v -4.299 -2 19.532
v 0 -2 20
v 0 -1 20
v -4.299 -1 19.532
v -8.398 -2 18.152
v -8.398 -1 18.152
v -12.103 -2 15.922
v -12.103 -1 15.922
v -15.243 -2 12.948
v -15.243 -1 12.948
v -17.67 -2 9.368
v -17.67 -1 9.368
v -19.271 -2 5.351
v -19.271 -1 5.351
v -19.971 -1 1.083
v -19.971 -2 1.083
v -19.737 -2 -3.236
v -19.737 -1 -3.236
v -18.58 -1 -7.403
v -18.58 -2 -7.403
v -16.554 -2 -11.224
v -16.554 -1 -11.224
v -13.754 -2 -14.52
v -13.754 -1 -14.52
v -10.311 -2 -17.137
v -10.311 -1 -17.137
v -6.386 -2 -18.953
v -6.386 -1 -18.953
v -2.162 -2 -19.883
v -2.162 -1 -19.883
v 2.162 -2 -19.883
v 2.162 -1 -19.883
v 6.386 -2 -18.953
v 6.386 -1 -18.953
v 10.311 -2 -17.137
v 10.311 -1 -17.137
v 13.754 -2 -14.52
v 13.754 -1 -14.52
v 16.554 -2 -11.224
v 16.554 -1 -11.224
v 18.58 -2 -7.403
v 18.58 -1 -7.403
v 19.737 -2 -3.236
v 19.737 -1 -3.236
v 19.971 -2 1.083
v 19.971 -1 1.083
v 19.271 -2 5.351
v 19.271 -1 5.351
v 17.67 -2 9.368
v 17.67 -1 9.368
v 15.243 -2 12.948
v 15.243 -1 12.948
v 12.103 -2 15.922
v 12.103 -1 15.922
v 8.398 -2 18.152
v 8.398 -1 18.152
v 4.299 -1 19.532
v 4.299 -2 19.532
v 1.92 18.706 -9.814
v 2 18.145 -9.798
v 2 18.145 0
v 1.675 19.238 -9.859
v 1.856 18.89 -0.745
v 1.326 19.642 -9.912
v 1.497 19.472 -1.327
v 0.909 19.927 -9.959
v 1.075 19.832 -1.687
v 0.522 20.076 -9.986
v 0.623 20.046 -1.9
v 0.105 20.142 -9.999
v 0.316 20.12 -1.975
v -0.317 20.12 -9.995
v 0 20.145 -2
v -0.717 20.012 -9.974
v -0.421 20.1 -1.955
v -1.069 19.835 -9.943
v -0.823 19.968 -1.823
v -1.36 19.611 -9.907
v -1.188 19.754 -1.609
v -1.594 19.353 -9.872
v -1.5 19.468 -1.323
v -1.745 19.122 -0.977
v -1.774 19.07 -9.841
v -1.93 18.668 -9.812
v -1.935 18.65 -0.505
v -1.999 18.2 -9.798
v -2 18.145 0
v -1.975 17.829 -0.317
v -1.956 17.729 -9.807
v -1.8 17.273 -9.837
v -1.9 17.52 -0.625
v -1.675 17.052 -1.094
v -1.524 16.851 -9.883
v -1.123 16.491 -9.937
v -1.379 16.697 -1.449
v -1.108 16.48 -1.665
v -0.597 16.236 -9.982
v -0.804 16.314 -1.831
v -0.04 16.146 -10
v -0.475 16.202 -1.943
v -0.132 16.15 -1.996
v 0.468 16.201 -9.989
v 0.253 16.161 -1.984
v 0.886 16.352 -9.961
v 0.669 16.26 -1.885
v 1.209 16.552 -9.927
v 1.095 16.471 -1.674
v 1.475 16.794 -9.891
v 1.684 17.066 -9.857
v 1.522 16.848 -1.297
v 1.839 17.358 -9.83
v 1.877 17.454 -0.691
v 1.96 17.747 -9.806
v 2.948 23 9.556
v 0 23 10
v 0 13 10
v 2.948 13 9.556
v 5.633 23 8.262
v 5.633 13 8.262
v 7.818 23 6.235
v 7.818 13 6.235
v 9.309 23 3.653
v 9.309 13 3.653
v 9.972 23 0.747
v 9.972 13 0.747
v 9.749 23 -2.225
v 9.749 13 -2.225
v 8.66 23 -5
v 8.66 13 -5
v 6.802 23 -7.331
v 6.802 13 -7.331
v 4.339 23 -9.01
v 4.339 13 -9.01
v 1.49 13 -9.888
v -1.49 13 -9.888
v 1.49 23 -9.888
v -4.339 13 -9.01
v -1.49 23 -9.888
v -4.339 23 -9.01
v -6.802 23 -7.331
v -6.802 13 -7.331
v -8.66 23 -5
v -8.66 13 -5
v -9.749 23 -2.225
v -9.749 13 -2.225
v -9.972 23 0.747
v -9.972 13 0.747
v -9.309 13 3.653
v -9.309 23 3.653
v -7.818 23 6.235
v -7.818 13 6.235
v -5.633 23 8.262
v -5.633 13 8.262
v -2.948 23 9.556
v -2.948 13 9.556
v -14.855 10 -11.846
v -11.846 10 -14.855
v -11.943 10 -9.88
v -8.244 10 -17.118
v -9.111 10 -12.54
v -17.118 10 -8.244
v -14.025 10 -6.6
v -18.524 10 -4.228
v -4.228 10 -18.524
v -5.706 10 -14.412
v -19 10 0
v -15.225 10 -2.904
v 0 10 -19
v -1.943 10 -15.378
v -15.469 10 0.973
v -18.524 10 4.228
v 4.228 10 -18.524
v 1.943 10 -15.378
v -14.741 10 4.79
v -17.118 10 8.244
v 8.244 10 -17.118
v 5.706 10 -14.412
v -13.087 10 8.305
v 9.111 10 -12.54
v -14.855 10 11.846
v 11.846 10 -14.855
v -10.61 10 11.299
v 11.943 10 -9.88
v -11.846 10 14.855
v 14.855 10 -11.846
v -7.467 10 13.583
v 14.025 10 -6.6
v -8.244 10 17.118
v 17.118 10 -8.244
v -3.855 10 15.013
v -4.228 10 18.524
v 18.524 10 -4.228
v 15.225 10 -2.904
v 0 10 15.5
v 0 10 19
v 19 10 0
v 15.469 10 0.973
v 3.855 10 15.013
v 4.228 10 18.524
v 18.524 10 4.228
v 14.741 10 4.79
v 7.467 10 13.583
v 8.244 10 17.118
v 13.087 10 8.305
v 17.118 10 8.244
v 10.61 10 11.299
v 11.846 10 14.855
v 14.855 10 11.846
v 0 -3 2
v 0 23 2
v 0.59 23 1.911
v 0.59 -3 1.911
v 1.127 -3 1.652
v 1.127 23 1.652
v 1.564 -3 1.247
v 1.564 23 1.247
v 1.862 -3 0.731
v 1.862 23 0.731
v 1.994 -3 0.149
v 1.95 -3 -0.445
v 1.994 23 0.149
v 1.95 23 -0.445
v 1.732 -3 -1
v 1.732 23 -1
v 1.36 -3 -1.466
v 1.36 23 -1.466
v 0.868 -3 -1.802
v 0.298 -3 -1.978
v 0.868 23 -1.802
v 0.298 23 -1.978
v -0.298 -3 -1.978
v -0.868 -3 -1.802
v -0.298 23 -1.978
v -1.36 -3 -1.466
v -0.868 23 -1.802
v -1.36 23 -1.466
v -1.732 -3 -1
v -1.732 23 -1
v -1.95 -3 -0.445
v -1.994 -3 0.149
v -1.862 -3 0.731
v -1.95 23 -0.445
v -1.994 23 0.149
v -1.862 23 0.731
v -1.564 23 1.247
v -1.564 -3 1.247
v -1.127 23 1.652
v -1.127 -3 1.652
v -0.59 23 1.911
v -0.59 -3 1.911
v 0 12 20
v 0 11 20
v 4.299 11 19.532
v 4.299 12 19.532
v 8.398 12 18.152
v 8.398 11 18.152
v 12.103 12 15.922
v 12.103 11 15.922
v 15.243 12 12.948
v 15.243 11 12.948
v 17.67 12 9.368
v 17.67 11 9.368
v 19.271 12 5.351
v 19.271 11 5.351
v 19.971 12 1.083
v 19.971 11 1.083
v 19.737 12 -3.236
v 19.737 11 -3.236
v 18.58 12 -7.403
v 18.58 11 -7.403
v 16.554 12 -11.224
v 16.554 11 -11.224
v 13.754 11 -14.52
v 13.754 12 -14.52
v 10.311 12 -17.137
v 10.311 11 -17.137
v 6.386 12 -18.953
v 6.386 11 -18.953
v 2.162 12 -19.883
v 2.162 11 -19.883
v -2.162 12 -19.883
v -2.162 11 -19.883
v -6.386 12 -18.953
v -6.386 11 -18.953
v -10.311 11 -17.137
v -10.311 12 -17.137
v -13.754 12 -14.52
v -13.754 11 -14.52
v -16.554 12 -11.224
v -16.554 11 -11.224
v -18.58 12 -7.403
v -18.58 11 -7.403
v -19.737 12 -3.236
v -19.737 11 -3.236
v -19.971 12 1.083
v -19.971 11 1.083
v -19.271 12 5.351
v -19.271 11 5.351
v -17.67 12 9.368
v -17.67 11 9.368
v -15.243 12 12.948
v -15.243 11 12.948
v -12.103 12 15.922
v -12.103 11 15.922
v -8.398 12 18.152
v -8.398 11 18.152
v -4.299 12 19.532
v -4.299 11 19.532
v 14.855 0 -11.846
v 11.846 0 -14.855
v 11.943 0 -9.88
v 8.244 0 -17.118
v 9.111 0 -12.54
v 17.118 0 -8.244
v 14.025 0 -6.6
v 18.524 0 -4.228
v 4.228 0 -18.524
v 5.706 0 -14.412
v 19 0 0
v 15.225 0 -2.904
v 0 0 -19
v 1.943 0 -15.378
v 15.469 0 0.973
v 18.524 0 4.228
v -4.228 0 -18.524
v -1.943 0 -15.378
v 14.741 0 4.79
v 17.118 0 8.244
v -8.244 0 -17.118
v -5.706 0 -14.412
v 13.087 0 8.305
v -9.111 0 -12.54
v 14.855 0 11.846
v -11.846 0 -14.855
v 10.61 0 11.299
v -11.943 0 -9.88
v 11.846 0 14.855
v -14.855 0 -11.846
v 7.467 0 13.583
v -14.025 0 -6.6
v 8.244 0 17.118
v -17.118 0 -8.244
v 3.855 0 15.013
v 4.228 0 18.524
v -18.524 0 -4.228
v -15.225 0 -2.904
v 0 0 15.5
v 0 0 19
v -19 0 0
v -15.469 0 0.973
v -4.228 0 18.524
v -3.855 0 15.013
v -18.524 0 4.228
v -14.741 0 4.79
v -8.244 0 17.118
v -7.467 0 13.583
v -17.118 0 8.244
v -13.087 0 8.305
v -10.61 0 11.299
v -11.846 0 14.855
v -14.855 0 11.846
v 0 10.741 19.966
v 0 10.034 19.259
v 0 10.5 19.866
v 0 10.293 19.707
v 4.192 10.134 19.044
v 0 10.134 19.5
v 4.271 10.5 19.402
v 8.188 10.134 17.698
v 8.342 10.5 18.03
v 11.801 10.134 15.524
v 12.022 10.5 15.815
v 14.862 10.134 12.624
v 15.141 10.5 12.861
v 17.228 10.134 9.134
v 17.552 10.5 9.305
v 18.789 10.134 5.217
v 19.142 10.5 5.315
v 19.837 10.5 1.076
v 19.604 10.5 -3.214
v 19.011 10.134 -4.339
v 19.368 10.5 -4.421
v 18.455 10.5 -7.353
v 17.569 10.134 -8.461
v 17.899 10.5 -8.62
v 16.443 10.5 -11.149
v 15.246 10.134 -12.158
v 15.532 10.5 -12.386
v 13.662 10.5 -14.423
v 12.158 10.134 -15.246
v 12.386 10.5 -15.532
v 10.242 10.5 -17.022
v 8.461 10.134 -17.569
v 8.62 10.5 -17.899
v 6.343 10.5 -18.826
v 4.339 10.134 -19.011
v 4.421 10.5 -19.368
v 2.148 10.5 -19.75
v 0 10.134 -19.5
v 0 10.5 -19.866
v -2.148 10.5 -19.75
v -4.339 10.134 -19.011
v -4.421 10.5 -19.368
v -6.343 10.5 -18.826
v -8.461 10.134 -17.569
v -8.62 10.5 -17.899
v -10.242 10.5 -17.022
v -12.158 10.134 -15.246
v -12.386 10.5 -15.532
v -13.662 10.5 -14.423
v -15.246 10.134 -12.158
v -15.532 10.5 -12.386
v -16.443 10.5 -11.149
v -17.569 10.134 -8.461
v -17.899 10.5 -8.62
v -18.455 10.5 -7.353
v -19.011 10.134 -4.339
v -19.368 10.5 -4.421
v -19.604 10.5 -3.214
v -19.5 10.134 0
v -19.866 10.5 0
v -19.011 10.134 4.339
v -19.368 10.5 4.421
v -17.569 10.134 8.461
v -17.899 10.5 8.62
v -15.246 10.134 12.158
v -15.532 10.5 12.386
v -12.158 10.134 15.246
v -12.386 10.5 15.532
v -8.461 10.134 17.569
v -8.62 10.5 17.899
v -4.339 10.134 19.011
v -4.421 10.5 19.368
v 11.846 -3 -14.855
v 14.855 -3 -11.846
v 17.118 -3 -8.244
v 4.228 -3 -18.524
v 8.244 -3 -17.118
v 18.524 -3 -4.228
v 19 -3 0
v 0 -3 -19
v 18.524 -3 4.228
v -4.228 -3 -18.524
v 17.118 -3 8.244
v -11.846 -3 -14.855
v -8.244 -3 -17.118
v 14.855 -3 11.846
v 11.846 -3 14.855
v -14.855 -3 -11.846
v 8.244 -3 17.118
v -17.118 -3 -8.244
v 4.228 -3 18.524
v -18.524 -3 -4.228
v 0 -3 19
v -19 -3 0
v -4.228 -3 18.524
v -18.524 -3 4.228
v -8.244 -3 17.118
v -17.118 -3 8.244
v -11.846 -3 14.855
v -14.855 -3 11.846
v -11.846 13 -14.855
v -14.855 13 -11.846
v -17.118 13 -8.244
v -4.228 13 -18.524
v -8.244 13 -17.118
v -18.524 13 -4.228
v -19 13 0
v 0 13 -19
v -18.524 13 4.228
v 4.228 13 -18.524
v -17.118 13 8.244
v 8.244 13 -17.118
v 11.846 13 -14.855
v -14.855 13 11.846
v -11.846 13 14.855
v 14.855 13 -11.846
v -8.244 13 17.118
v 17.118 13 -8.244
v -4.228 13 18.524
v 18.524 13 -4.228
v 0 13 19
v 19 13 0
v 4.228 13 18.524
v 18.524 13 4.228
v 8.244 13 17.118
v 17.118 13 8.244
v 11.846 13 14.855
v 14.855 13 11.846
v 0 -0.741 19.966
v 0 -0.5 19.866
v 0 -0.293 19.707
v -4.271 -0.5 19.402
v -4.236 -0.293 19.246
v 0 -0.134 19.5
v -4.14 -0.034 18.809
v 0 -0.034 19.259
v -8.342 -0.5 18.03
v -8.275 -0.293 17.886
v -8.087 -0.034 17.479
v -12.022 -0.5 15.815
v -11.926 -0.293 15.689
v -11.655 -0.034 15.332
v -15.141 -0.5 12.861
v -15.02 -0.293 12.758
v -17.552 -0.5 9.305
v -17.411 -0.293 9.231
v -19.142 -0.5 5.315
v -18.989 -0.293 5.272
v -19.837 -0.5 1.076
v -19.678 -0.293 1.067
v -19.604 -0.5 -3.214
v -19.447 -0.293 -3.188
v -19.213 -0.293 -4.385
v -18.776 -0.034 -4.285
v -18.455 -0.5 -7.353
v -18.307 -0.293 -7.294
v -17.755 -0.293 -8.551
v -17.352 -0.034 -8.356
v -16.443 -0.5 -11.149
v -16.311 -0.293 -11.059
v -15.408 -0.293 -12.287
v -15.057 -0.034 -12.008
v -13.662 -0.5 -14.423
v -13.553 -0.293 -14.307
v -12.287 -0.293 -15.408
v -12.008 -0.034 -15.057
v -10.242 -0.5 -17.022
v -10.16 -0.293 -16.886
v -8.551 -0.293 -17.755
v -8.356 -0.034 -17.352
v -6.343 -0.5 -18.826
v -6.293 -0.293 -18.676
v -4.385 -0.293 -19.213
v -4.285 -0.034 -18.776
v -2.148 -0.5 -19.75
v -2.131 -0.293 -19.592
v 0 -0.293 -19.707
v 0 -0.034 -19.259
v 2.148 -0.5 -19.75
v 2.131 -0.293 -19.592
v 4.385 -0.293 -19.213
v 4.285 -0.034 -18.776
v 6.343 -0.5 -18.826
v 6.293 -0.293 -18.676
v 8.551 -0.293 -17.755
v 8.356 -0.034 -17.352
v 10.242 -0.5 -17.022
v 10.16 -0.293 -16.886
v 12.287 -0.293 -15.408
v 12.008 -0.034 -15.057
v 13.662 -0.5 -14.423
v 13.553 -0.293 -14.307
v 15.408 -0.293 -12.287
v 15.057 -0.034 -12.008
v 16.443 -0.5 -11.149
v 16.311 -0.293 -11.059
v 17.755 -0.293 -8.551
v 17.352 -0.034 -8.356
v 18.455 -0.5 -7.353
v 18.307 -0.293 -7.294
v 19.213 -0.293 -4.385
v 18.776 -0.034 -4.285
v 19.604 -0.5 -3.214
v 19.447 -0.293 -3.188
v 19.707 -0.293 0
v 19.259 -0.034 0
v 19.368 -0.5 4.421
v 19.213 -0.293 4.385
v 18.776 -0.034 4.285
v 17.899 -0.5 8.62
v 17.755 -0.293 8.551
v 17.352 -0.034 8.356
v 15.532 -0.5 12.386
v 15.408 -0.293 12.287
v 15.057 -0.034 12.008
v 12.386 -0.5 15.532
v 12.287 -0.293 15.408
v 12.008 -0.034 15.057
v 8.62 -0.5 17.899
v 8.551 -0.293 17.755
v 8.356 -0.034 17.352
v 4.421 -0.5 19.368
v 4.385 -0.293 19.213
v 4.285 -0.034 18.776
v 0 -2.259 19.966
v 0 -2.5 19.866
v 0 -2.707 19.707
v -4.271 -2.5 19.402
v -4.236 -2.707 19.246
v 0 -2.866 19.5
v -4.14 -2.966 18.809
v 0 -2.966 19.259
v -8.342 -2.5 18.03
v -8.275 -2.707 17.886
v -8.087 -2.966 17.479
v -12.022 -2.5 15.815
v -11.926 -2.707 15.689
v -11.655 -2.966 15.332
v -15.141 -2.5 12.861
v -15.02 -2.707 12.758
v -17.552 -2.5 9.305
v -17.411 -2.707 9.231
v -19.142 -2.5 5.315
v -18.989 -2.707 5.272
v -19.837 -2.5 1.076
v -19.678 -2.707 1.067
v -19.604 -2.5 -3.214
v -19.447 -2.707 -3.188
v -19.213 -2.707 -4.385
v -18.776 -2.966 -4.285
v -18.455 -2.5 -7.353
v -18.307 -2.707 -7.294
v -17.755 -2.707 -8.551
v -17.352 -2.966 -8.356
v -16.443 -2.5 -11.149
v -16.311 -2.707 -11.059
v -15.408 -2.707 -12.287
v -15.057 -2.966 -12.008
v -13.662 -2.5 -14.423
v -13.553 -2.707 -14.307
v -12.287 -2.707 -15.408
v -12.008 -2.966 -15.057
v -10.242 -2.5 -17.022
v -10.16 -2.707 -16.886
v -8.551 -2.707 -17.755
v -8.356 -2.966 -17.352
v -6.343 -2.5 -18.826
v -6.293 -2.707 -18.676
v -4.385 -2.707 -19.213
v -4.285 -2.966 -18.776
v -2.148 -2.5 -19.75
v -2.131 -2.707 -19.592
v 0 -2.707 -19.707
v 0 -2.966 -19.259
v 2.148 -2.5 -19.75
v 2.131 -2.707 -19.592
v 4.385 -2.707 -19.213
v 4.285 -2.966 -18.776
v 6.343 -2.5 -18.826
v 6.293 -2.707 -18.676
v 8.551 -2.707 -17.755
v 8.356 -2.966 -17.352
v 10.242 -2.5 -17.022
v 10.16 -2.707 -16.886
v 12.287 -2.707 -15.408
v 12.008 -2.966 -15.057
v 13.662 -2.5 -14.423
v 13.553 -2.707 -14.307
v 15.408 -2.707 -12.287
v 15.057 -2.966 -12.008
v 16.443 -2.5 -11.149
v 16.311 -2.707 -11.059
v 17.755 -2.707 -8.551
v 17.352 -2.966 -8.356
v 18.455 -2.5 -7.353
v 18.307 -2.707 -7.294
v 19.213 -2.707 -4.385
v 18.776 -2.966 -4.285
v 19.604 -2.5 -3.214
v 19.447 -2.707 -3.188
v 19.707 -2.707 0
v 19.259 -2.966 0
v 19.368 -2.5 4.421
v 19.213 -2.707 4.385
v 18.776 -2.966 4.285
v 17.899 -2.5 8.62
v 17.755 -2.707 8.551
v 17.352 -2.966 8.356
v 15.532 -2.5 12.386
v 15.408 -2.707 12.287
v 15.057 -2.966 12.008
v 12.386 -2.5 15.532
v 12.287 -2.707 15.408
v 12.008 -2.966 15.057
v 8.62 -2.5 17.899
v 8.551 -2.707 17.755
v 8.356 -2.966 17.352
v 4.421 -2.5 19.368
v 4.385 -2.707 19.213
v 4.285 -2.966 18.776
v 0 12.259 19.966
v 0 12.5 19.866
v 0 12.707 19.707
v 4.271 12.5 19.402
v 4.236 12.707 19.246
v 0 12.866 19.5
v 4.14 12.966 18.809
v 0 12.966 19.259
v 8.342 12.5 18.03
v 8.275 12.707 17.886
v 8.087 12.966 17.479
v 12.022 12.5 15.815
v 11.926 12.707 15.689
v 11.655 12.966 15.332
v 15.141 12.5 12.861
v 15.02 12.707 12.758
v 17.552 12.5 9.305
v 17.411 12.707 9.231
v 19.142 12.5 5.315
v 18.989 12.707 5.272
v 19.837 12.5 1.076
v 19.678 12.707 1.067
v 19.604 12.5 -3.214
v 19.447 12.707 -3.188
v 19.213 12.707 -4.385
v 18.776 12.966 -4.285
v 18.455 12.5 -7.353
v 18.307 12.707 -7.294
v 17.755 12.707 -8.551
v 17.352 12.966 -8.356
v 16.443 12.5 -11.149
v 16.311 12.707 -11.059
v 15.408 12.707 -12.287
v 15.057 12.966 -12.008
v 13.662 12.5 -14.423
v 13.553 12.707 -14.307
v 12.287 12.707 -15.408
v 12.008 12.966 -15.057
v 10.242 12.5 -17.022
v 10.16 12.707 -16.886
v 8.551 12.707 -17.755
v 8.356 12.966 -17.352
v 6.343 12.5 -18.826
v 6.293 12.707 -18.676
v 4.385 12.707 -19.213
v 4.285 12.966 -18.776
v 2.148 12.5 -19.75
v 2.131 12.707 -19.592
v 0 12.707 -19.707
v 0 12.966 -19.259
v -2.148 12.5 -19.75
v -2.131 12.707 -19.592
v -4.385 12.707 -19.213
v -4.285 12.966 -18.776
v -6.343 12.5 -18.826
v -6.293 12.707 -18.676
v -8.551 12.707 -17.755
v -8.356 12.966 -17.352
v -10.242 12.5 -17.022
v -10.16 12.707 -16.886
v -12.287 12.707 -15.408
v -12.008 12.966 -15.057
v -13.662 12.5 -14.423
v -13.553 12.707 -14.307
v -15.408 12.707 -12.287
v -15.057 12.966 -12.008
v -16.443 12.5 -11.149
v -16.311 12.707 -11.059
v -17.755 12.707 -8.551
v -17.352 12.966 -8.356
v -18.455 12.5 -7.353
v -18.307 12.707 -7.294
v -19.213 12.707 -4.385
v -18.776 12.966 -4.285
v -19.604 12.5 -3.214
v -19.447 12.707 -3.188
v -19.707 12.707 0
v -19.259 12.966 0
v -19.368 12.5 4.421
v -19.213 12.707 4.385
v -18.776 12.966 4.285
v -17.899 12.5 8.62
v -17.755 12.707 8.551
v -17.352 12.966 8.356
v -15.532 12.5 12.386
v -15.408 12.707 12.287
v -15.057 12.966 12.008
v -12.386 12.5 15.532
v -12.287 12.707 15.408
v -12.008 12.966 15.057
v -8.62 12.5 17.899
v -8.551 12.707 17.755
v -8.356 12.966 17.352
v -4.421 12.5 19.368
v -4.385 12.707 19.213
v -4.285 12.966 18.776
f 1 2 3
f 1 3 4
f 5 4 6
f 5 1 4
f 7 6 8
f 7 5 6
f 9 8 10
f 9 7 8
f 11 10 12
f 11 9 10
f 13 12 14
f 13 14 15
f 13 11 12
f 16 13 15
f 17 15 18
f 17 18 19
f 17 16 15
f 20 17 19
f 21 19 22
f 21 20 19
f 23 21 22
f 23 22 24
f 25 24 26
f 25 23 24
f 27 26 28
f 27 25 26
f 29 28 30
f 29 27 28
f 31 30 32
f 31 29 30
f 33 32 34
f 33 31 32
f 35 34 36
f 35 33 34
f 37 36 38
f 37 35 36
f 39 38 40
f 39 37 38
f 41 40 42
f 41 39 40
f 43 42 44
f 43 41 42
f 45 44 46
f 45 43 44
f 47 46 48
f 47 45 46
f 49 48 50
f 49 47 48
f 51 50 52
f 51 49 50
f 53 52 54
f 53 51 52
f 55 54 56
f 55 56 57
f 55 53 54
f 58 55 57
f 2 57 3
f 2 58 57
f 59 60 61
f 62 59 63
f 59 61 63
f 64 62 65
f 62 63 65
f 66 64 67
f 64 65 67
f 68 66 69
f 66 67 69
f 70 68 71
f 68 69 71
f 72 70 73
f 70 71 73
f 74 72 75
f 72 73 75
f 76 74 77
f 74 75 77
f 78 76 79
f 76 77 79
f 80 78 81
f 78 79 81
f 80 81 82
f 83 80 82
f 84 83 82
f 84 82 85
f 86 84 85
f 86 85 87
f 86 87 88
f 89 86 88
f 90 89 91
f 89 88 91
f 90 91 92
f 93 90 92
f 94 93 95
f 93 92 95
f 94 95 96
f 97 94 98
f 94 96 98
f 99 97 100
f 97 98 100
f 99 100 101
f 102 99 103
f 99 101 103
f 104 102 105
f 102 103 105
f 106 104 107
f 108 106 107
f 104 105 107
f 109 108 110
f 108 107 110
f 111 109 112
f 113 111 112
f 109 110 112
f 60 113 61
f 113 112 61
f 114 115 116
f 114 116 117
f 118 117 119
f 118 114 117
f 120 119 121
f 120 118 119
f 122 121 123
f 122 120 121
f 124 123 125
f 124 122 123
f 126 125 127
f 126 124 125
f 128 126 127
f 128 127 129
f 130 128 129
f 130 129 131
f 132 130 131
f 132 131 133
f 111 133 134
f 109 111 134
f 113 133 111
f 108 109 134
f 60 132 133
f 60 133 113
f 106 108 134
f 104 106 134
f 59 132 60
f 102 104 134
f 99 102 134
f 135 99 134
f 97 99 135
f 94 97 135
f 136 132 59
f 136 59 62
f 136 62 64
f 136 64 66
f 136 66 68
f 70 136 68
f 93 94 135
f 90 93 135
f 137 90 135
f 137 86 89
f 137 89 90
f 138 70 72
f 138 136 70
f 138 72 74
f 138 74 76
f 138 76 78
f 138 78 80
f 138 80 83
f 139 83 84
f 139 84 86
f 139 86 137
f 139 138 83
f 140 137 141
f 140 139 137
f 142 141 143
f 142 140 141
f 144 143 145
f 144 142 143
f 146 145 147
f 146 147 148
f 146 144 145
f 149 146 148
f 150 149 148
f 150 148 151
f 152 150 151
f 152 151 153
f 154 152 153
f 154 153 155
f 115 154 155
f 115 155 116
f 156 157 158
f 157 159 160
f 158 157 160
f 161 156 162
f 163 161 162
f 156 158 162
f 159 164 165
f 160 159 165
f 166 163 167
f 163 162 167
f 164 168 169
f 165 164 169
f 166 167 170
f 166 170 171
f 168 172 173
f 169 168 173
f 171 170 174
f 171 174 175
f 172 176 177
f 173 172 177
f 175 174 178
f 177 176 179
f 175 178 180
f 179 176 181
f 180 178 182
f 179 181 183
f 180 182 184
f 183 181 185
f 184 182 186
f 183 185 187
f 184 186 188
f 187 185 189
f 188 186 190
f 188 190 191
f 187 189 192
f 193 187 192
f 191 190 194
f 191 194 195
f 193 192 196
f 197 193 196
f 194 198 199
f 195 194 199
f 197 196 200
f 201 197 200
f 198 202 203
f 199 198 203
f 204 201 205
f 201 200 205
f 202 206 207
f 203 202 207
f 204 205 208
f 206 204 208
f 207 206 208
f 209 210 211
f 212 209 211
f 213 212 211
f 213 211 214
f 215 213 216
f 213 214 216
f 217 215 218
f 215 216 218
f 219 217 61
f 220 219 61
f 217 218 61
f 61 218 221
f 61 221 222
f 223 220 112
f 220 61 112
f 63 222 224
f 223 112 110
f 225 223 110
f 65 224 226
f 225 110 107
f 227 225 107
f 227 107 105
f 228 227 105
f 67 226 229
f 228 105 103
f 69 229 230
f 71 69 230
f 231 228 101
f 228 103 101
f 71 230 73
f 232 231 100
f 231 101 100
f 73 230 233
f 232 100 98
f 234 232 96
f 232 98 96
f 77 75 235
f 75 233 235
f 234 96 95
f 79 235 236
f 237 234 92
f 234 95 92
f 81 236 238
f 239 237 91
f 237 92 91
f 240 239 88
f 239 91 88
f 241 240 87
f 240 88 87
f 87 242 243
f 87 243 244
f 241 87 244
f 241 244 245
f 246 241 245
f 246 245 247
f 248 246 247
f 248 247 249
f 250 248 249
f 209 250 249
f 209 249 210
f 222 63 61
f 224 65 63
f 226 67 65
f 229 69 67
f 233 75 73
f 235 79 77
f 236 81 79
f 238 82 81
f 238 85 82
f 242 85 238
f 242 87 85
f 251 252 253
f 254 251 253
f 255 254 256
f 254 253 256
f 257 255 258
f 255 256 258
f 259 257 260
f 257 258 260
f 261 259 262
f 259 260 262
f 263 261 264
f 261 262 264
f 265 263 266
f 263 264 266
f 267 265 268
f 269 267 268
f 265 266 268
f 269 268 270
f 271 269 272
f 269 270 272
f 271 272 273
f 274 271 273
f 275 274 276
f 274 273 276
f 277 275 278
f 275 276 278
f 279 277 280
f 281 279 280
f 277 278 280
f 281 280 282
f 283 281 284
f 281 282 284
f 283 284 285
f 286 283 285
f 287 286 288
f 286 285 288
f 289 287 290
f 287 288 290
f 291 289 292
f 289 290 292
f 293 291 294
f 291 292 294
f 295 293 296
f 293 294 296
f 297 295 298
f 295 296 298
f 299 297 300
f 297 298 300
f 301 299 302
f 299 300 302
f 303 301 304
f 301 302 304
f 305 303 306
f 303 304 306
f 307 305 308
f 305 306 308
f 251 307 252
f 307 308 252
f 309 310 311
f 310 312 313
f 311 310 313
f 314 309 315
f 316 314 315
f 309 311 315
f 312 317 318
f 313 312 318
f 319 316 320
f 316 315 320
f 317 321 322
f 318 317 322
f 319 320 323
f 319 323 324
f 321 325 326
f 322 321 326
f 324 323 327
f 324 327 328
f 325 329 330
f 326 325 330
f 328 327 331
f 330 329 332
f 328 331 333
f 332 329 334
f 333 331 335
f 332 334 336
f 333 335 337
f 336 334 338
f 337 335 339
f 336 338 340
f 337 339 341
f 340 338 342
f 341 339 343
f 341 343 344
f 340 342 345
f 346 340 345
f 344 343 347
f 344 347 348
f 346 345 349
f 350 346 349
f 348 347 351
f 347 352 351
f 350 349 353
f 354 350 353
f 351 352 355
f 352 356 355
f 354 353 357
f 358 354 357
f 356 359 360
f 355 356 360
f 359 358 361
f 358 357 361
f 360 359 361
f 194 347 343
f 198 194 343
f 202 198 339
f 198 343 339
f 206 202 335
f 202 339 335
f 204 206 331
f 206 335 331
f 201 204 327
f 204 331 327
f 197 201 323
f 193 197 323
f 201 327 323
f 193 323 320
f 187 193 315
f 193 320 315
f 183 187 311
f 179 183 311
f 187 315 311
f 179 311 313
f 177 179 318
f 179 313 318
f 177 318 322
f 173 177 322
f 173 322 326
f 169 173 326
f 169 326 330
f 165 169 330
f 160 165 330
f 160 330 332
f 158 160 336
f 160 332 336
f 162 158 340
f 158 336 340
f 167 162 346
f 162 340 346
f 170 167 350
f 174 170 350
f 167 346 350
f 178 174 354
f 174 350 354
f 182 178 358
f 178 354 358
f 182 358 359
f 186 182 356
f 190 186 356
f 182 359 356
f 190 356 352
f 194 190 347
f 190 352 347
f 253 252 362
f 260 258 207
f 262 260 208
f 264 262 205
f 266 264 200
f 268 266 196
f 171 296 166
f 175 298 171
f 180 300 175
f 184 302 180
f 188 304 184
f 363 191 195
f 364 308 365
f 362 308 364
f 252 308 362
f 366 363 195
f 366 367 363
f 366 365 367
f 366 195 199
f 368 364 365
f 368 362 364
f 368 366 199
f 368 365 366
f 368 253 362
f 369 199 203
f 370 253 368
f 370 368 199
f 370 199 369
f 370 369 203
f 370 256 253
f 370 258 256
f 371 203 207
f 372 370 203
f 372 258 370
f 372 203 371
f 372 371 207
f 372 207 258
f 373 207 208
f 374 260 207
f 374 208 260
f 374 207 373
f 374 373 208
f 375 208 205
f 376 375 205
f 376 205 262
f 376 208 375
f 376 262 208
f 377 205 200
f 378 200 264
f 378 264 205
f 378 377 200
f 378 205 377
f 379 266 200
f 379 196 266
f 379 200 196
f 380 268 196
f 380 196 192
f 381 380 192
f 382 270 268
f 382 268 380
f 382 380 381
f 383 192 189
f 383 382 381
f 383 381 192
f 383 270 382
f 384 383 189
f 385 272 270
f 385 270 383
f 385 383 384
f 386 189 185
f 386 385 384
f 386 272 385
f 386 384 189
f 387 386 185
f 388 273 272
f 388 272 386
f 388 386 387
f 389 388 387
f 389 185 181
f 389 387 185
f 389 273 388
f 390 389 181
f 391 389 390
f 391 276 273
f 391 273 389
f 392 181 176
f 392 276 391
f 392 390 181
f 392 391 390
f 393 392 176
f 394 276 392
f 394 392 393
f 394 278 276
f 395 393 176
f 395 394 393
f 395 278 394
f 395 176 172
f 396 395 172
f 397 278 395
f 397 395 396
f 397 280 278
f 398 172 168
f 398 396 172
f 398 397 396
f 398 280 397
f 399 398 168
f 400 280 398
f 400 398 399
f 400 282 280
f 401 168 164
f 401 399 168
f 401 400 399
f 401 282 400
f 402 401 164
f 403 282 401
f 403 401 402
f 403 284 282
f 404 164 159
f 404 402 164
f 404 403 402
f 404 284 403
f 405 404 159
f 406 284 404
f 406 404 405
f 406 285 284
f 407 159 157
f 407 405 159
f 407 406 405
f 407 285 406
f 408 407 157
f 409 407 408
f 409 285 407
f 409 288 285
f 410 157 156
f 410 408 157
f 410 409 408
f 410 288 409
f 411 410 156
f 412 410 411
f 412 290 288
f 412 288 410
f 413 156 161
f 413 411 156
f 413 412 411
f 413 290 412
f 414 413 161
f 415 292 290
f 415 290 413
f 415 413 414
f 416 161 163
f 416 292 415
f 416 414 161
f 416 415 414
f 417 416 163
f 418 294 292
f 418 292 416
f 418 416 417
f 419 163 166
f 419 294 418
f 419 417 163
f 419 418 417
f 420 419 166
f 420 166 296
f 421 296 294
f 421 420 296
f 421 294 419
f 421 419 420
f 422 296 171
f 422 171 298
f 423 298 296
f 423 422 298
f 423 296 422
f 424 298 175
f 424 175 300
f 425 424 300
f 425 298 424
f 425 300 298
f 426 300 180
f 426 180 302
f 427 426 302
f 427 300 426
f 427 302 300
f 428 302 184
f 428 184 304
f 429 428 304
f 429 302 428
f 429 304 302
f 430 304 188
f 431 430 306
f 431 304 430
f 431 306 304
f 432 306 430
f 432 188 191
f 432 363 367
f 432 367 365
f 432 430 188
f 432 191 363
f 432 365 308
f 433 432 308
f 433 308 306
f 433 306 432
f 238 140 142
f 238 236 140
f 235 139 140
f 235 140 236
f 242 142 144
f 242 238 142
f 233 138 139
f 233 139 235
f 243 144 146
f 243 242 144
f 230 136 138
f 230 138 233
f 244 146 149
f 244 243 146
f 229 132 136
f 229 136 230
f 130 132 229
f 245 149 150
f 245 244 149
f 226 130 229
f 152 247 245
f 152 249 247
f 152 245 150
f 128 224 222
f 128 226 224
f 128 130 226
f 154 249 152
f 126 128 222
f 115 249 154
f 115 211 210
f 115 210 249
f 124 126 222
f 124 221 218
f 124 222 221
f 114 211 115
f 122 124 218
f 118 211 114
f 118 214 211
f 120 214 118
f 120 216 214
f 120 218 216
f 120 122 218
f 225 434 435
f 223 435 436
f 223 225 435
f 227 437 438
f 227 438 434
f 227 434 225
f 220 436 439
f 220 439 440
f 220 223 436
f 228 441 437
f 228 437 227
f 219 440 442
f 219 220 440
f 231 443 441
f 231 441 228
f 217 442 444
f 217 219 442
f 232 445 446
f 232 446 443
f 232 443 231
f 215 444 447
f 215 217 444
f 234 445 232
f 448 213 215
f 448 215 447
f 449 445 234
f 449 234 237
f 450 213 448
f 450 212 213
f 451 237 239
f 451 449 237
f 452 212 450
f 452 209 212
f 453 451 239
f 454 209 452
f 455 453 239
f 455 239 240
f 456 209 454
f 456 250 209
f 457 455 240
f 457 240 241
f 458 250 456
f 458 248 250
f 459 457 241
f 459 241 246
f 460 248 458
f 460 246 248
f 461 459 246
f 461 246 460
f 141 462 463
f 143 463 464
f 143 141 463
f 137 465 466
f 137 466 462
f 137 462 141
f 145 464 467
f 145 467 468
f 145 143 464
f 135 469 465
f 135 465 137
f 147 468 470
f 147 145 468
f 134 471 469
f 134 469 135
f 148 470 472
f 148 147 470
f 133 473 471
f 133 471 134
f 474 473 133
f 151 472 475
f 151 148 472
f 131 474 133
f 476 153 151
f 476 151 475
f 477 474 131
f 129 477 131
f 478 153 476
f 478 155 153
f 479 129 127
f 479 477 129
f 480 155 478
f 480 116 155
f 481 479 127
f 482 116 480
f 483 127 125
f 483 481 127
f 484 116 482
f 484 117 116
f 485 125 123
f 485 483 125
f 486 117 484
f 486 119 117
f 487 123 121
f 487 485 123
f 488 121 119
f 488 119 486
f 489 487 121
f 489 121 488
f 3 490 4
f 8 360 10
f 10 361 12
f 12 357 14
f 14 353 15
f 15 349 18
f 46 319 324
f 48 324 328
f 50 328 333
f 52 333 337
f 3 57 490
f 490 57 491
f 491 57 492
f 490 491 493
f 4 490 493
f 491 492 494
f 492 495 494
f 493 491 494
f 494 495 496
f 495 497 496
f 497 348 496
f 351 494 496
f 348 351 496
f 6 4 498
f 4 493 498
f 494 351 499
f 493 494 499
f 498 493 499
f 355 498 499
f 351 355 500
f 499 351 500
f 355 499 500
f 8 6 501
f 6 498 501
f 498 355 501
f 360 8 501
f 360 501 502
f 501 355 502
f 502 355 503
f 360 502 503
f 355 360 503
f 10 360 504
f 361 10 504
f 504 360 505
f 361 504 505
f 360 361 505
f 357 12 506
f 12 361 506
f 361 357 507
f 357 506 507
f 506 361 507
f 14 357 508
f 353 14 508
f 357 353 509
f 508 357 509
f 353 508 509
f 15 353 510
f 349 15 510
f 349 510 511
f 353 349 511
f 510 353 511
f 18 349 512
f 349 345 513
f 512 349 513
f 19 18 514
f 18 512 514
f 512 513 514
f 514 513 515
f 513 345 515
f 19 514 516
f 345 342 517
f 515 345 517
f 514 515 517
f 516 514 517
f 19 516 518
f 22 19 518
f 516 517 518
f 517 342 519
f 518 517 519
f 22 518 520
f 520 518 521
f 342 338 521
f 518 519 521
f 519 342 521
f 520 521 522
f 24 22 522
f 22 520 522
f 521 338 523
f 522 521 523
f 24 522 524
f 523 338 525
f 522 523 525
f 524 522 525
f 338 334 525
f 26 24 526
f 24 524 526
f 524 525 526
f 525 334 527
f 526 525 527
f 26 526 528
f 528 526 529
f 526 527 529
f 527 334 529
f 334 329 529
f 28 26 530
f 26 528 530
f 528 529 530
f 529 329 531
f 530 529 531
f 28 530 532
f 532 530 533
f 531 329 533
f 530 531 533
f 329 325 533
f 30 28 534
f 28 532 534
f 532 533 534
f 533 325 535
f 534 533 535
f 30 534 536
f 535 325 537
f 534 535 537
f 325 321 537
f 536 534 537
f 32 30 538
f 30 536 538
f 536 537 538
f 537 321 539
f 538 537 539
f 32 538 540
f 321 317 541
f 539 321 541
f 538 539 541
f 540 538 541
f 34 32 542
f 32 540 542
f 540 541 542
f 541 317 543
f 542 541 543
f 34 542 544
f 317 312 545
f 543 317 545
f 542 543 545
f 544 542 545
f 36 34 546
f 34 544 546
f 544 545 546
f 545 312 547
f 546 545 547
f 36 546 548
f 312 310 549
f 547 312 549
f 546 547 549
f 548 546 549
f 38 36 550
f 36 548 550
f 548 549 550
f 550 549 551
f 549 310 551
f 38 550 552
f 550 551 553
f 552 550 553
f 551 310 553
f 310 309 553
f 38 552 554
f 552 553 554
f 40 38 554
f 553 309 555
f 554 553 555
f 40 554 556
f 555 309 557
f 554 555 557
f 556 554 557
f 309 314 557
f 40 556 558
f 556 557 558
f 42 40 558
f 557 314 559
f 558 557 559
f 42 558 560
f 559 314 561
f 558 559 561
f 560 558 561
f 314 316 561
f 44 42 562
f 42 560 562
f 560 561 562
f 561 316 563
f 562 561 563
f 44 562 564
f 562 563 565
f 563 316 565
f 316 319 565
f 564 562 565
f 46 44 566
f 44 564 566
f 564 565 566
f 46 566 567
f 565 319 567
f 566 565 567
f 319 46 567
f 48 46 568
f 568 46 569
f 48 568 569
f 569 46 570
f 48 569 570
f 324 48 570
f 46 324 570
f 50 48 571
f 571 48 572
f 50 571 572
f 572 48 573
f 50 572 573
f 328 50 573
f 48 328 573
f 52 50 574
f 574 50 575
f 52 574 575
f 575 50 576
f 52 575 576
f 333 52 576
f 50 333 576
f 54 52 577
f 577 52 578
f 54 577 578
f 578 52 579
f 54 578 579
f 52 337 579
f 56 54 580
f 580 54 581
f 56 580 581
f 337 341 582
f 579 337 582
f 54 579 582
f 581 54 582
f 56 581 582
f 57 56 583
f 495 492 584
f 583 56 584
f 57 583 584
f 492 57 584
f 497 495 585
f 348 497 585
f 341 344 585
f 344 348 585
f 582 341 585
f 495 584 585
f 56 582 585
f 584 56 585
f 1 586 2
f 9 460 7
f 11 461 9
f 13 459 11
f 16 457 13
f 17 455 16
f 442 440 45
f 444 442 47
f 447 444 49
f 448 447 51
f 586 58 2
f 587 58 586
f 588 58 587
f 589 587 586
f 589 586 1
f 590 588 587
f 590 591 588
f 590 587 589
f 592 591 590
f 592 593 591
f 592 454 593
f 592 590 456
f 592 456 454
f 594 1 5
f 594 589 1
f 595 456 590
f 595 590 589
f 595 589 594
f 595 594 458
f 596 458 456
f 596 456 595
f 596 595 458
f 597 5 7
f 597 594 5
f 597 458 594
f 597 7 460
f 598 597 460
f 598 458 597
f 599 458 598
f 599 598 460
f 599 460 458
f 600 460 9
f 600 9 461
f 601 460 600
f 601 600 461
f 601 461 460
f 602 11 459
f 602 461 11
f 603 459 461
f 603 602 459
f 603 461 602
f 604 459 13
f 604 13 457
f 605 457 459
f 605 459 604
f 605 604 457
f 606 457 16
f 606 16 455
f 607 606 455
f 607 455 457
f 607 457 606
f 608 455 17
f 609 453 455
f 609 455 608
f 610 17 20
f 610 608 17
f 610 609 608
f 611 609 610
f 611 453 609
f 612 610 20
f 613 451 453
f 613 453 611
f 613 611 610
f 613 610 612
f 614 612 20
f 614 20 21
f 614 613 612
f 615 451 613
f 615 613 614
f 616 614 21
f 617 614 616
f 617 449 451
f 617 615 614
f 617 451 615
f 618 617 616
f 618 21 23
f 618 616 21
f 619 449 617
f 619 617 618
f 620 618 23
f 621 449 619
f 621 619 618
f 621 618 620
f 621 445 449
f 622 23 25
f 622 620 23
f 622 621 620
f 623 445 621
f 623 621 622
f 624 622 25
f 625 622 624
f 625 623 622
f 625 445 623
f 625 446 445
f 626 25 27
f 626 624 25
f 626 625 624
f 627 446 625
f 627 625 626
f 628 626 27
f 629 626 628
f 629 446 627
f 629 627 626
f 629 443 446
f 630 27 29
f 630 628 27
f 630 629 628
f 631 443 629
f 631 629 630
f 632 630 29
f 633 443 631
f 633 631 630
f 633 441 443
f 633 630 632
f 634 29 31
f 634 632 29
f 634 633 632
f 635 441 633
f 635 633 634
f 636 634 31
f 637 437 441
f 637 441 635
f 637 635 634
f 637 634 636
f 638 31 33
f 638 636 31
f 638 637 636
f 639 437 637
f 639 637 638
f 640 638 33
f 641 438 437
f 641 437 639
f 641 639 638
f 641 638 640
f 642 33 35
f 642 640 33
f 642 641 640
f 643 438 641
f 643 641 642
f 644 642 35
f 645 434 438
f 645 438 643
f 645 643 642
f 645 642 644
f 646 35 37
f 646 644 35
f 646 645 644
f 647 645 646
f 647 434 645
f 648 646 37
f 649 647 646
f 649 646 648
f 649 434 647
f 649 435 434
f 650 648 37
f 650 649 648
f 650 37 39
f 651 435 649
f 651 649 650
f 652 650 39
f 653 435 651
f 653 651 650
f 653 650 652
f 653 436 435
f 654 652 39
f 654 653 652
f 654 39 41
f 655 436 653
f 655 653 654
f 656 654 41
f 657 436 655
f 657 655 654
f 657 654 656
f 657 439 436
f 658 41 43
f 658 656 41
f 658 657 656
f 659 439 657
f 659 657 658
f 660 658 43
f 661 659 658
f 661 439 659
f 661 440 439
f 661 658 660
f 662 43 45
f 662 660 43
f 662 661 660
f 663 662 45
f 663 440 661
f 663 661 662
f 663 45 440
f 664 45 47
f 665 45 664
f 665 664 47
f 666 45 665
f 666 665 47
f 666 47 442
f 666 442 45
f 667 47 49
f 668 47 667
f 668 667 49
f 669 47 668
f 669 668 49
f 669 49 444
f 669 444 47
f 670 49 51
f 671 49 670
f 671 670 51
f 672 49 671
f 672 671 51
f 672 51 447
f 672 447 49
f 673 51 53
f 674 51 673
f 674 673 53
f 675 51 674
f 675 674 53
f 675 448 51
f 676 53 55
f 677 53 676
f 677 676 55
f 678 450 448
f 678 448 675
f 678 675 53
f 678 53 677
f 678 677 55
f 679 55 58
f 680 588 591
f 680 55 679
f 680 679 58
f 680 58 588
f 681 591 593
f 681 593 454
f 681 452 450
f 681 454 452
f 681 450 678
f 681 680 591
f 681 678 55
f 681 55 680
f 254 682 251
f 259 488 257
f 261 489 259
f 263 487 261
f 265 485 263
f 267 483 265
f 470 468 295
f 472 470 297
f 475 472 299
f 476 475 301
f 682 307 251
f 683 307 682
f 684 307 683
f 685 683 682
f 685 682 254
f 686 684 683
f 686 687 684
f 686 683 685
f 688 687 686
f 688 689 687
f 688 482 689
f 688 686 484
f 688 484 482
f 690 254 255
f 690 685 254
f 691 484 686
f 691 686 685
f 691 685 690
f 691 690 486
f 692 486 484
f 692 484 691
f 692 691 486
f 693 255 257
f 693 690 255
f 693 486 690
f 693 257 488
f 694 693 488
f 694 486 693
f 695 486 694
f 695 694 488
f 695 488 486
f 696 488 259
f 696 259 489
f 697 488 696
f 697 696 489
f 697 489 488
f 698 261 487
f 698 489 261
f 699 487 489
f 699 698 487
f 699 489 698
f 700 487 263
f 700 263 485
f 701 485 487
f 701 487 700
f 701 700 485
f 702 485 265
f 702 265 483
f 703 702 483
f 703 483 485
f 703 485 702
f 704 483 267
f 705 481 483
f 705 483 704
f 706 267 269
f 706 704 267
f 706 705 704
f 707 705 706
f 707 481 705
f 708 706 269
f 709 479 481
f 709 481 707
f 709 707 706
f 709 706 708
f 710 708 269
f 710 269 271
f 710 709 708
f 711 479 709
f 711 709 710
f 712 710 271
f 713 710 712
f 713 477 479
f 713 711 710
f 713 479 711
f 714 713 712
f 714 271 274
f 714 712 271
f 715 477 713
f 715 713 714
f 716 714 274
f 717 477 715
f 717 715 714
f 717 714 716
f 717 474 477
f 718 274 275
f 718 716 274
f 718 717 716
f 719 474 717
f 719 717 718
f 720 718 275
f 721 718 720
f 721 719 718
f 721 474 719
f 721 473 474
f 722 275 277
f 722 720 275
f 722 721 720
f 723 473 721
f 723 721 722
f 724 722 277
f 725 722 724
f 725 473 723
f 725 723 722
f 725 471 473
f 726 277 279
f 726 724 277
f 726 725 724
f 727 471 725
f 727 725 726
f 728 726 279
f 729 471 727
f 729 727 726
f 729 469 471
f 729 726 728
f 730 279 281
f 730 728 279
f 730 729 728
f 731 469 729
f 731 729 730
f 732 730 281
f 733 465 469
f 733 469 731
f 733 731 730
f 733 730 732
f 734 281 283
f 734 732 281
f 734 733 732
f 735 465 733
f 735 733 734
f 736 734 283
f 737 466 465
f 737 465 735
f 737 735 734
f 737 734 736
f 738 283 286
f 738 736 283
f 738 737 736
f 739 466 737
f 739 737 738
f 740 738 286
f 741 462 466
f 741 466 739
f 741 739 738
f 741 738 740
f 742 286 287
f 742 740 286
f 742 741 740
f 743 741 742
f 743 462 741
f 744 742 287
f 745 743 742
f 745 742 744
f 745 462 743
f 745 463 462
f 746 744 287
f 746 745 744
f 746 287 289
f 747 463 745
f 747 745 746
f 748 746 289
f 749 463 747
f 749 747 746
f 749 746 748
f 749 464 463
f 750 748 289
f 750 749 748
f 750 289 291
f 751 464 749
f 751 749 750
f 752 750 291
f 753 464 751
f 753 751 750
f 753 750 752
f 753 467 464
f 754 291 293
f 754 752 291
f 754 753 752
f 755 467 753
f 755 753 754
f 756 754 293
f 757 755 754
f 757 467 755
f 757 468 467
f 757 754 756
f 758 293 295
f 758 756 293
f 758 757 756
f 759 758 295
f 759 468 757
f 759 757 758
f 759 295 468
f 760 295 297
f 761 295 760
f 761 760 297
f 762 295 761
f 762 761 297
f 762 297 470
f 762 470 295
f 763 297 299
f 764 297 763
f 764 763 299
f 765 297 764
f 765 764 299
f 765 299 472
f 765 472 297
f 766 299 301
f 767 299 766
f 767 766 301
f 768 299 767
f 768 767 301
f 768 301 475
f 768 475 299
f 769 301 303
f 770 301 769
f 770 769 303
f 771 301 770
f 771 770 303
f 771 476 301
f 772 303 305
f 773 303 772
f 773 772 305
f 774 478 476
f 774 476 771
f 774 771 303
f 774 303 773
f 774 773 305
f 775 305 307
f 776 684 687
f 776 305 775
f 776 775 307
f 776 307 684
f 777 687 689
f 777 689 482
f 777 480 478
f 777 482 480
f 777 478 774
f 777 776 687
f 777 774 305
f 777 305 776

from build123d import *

# Parameters (mm, degrees)
SKETCH_1_R          = 15.5
EXTRUDE_1_DEPTH     = 10
SKETCH_2_R          = 20
EXTRUDE_2_DEPTH     = 3
EXTRUDE_START       = 3
SKETCH_3_R          = 20
EXTRUDE_3_DEPTH     = 3
FILLET_2_R          = 1
SKETCH_4_R          = 2
CUT_EXTRUDE_1_DEPTH = 33.49615368
EXTRUDE_START_2     = 10
SKETCH_5_R          = 10
SKETCH_5_R_2        = 2
EXTRUDE_4_DEPTH     = 10
SKETCH_6_R          = 2
CUT_EXTRUDE_2_DEPTH = 37.455452322


with BuildPart() as part:
    # 草图1 → 凸台-拉伸1 (new body)
    with BuildSketch(Plane(origin=(0, 0, 0), x_dir=(1, 0, 0), z_dir=(0, 1, 0))):
        with Locations(Location((0, 0, 0), (0, 0, 270))):
            Circle(SKETCH_1_R)
    extrude(amount=EXTRUDE_1_DEPTH)

    # 草图2 → 凸台-拉伸2 (add)
    with BuildSketch(Plane(origin=(0, 10, 0), x_dir=(1, 0, 0), z_dir=(0, 1, 0))):
        with Locations(Location((0, 0, 0), (0, 0, 270))):
            Circle(SKETCH_2_R)
    extrude(amount=EXTRUDE_2_DEPTH)

    # 草图3 → 凸台-拉伸3 (add)
    with BuildSketch(Plane.XZ.offset(EXTRUDE_START)):
        with Locations(Location((0, 0, 0), (0, 0, 90))):
            Circle(SKETCH_3_R)
    extrude(amount=-EXTRUDE_3_DEPTH)

    # 圆角2
    fillet_2_edges = [part.edges().sort_by_distance(p)[0] for p in [
        (0, -3, -20),
        (0, 10, -20),
        (0, 13, -20),
        (0, 0, -20),
    ]]
    fillet(fillet_2_edges, radius=FILLET_2_R)

    # 草图4 → 切除-拉伸1 (cut, through all)
    with BuildSketch(Plane(origin=(0, 13, 0), x_dir=(1, 0, 0), z_dir=(0, 1, 0))):
        with Locations(Location((0, 0, 0), (0, 0, 270))):
            Circle(SKETCH_4_R)
    extrude(amount=-CUT_EXTRUDE_1_DEPTH, mode=Mode.SUBTRACT)

    # 草图5 → 凸台-拉伸4 (add)
    with BuildSketch(Plane(origin=(0, 13, 0), x_dir=(1, 0, 0), z_dir=(0, 1, 0)).offset(EXTRUDE_START_2)):
        with Locations(Location((0, 0, 0), (0, 0, 270))):
            Circle(SKETCH_5_R)
        with Locations(Location((0, 0, 0), (0, 0, 270))):
            Circle(SKETCH_5_R_2, mode=Mode.SUBTRACT)
    extrude(amount=-EXTRUDE_4_DEPTH)

    # 草图6 → 切除-拉伸2 (cut, through all)
    with BuildSketch(Plane.XY):
        with Locations((0, 18.145224443)):
            Circle(SKETCH_6_R)
    extrude(amount=-CUT_EXTRUDE_2_DEPTH, mode=Mode.SUBTRACT)


solid = part.part
